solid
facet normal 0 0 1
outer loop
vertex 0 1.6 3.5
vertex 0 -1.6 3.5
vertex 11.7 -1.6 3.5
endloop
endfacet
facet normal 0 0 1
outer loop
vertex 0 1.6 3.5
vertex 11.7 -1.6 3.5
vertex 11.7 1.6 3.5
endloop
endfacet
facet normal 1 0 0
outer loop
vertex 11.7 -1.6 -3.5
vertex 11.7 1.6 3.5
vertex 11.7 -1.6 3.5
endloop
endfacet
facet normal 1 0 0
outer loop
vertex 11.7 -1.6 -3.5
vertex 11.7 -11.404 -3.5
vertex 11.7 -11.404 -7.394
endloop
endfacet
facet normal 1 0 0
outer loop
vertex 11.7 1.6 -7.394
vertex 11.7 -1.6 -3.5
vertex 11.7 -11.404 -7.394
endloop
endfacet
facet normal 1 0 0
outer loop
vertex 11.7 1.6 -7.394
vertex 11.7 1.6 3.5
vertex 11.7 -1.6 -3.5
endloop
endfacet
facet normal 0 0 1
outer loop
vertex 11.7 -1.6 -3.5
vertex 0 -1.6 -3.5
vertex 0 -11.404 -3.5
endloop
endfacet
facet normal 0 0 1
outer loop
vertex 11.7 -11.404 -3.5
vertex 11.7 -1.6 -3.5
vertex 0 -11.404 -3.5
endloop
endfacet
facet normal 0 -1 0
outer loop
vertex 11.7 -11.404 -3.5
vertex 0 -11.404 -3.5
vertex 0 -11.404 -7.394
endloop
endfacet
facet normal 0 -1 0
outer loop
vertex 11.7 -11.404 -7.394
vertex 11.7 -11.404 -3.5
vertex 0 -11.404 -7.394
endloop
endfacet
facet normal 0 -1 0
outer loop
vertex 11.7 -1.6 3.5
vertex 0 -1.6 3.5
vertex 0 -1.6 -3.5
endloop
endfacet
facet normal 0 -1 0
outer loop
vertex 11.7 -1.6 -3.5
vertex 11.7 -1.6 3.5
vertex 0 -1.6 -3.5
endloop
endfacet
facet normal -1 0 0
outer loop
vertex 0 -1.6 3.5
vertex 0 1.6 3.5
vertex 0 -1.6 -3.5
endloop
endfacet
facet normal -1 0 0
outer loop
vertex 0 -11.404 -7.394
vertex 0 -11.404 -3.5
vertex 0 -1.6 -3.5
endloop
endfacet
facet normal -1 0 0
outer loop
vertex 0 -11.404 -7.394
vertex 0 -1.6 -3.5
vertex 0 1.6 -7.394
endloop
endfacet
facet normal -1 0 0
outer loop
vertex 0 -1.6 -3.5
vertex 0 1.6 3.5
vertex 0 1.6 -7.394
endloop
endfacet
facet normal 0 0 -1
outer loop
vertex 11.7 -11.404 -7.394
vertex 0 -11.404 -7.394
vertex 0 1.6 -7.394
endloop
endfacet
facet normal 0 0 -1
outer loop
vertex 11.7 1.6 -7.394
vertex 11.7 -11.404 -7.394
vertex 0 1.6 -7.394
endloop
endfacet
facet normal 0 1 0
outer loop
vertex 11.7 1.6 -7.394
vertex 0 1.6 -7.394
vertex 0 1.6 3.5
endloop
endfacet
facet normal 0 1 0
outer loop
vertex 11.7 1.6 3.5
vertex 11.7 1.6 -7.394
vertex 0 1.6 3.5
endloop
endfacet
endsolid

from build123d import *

# Parameters (mm, degrees)
SKETCH1_W           = 7
SKETCH1_H           = 3.2
BOSS_EXTRUDE1_DEPTH = 11.7


with BuildPart() as part:
    # Sketch1 → Boss-Extrude1 (new body)
    with BuildSketch(Plane(origin=(0, 0, 0), x_dir=(0, 0, -1), z_dir=(1, 0, 0))):
        Rectangle(SKETCH1_W, SKETCH1_H)
        Polygon((3.5, 1.6), (3.5, -1.6), (3.5, -11.404255319), (7.393617021, -11.404255319), (7.393617021, 1.6), align=None)
    extrude(amount=BOSS_EXTRUDE1_DEPTH)


solid = part.part
